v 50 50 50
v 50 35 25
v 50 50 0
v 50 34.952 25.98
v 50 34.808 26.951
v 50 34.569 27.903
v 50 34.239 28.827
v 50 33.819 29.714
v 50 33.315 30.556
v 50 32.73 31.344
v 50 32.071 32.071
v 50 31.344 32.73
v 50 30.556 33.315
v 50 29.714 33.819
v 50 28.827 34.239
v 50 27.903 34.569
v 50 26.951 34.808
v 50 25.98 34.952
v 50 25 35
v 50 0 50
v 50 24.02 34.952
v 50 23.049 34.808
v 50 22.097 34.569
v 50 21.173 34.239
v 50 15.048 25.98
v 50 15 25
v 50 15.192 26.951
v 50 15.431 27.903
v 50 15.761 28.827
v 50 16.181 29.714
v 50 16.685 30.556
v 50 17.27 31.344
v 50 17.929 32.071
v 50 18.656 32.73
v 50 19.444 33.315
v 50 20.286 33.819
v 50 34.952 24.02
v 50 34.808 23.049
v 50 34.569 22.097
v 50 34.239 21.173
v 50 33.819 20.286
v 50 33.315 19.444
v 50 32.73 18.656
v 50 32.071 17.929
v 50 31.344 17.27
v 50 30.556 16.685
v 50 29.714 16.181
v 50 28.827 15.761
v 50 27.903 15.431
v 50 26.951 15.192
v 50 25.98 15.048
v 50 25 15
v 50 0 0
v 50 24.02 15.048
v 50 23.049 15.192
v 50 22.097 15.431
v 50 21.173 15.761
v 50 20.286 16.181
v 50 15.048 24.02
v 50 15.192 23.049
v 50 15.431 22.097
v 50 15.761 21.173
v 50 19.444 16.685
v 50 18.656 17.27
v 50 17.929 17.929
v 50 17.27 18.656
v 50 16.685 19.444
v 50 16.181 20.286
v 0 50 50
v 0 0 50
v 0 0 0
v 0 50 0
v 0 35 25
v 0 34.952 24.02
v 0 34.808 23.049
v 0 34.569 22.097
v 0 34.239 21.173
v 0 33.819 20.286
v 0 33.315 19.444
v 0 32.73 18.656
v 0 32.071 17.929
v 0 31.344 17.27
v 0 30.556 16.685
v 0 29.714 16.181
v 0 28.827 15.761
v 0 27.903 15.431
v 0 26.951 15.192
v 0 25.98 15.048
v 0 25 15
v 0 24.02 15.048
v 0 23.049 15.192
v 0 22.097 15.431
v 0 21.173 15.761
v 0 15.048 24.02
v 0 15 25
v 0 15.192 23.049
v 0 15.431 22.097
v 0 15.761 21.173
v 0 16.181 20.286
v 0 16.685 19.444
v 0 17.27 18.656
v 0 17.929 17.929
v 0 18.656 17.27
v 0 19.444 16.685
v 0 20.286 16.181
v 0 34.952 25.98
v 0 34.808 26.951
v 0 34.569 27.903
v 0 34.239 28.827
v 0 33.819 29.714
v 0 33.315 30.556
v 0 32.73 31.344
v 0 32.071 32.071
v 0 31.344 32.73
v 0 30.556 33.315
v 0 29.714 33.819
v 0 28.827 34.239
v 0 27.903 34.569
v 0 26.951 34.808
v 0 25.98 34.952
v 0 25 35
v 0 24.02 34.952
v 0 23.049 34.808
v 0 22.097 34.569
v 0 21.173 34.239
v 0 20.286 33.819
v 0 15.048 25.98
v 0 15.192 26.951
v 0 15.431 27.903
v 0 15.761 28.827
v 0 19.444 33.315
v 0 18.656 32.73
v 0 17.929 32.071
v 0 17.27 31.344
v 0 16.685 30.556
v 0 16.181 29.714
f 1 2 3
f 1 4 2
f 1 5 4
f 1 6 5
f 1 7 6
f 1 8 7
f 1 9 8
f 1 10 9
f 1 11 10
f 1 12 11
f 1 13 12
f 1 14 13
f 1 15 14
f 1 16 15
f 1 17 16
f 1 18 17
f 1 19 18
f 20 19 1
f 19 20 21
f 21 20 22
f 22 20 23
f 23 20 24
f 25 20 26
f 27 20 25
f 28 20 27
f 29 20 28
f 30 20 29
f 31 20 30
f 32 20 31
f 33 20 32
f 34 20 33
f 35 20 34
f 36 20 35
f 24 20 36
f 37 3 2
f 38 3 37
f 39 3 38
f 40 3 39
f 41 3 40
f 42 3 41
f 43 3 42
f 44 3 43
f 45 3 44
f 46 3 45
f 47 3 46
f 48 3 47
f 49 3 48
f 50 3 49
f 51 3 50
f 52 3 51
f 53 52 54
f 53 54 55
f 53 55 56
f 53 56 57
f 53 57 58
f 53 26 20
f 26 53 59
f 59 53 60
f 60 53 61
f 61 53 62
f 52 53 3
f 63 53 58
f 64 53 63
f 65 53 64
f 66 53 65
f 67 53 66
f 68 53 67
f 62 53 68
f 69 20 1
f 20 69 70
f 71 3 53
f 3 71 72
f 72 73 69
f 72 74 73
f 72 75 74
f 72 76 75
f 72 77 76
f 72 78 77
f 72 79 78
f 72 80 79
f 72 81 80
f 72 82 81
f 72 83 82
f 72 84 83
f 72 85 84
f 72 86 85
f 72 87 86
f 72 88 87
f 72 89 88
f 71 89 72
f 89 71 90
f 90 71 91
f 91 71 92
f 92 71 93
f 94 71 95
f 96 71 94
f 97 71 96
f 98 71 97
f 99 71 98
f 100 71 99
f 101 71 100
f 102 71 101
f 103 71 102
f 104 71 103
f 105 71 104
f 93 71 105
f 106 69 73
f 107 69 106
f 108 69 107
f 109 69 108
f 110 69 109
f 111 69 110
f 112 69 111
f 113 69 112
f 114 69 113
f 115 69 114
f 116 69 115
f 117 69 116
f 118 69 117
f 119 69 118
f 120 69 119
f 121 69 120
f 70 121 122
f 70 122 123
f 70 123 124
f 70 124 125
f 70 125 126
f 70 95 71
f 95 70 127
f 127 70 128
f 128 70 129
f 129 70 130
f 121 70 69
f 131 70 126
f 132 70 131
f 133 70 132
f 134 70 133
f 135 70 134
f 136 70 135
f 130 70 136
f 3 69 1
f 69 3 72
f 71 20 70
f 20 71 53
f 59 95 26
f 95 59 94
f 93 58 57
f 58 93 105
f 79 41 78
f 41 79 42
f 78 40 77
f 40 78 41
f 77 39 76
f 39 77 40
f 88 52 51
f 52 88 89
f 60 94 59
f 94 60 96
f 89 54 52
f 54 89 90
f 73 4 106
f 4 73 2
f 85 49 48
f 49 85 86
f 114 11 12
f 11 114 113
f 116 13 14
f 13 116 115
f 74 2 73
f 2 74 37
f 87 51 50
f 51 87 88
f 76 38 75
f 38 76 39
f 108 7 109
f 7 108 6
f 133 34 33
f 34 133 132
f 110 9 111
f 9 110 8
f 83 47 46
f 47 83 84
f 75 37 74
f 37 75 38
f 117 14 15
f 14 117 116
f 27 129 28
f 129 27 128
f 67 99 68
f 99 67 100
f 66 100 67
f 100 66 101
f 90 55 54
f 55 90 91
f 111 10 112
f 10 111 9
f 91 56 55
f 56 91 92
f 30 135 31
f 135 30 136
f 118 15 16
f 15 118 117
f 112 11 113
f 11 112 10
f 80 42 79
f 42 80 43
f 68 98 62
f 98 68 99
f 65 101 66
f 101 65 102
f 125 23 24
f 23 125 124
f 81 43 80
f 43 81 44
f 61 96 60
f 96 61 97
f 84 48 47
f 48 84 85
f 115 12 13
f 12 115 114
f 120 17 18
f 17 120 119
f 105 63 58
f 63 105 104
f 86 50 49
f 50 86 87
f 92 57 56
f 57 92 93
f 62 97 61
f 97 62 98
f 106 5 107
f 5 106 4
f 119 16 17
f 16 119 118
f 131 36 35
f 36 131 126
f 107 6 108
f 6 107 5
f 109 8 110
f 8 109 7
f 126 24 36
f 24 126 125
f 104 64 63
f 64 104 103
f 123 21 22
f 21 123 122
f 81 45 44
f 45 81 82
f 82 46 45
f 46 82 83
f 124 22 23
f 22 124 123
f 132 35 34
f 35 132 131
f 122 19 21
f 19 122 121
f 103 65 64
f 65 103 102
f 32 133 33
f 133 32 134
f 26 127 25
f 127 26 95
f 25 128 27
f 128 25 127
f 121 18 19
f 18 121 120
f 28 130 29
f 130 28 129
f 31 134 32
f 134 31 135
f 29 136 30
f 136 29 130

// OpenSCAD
module mcube()
{
    cube(50);
}
module hole()
{
    translate([0, 25,25]) 
    rotate([0,90,0]) cylinder(50, d = 20,center = false, $fn=64);
}
module body()
{
    difference()
    {
        mcube();
        hole();
    }
}
body();
//hole();
